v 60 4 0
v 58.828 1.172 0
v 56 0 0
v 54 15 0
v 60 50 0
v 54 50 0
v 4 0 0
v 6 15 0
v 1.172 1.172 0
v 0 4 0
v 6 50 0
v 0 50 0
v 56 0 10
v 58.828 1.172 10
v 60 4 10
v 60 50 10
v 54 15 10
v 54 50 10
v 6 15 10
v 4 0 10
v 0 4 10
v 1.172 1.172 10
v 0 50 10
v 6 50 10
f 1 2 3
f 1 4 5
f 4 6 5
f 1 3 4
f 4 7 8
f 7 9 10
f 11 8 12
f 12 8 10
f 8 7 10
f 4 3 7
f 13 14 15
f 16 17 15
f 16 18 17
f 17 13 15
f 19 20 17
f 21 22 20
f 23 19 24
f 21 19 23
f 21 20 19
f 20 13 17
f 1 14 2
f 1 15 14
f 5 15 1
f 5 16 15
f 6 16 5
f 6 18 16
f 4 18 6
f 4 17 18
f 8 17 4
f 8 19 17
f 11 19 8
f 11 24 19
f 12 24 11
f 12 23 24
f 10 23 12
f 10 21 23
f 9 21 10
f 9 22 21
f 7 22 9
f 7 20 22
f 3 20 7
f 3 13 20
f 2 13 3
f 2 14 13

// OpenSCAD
$fn = 32;

// ----------------------------------------------------------------------
// Heat sink frame: 60 x 50 mm frame, 6 mm walls
// ----------------------------------------------------------------------

// --- parameters (mm) ---
profile_height = 10;      // extrusion height
profile_points = 12;      // points of the closed outline

profile = [[0, 4], [1.172, 1.172], [4, 0], [56, 0], [58.828, 1.172], [60, 4], [60, 50], [54, 50], [54, 15], [6, 15], [6, 50], [0, 50]];  // single closed polygon, 12 points, counter clockwise

// --- the one profile operation ---
linear_extrude(height = profile_height) polygon(points = profile);
